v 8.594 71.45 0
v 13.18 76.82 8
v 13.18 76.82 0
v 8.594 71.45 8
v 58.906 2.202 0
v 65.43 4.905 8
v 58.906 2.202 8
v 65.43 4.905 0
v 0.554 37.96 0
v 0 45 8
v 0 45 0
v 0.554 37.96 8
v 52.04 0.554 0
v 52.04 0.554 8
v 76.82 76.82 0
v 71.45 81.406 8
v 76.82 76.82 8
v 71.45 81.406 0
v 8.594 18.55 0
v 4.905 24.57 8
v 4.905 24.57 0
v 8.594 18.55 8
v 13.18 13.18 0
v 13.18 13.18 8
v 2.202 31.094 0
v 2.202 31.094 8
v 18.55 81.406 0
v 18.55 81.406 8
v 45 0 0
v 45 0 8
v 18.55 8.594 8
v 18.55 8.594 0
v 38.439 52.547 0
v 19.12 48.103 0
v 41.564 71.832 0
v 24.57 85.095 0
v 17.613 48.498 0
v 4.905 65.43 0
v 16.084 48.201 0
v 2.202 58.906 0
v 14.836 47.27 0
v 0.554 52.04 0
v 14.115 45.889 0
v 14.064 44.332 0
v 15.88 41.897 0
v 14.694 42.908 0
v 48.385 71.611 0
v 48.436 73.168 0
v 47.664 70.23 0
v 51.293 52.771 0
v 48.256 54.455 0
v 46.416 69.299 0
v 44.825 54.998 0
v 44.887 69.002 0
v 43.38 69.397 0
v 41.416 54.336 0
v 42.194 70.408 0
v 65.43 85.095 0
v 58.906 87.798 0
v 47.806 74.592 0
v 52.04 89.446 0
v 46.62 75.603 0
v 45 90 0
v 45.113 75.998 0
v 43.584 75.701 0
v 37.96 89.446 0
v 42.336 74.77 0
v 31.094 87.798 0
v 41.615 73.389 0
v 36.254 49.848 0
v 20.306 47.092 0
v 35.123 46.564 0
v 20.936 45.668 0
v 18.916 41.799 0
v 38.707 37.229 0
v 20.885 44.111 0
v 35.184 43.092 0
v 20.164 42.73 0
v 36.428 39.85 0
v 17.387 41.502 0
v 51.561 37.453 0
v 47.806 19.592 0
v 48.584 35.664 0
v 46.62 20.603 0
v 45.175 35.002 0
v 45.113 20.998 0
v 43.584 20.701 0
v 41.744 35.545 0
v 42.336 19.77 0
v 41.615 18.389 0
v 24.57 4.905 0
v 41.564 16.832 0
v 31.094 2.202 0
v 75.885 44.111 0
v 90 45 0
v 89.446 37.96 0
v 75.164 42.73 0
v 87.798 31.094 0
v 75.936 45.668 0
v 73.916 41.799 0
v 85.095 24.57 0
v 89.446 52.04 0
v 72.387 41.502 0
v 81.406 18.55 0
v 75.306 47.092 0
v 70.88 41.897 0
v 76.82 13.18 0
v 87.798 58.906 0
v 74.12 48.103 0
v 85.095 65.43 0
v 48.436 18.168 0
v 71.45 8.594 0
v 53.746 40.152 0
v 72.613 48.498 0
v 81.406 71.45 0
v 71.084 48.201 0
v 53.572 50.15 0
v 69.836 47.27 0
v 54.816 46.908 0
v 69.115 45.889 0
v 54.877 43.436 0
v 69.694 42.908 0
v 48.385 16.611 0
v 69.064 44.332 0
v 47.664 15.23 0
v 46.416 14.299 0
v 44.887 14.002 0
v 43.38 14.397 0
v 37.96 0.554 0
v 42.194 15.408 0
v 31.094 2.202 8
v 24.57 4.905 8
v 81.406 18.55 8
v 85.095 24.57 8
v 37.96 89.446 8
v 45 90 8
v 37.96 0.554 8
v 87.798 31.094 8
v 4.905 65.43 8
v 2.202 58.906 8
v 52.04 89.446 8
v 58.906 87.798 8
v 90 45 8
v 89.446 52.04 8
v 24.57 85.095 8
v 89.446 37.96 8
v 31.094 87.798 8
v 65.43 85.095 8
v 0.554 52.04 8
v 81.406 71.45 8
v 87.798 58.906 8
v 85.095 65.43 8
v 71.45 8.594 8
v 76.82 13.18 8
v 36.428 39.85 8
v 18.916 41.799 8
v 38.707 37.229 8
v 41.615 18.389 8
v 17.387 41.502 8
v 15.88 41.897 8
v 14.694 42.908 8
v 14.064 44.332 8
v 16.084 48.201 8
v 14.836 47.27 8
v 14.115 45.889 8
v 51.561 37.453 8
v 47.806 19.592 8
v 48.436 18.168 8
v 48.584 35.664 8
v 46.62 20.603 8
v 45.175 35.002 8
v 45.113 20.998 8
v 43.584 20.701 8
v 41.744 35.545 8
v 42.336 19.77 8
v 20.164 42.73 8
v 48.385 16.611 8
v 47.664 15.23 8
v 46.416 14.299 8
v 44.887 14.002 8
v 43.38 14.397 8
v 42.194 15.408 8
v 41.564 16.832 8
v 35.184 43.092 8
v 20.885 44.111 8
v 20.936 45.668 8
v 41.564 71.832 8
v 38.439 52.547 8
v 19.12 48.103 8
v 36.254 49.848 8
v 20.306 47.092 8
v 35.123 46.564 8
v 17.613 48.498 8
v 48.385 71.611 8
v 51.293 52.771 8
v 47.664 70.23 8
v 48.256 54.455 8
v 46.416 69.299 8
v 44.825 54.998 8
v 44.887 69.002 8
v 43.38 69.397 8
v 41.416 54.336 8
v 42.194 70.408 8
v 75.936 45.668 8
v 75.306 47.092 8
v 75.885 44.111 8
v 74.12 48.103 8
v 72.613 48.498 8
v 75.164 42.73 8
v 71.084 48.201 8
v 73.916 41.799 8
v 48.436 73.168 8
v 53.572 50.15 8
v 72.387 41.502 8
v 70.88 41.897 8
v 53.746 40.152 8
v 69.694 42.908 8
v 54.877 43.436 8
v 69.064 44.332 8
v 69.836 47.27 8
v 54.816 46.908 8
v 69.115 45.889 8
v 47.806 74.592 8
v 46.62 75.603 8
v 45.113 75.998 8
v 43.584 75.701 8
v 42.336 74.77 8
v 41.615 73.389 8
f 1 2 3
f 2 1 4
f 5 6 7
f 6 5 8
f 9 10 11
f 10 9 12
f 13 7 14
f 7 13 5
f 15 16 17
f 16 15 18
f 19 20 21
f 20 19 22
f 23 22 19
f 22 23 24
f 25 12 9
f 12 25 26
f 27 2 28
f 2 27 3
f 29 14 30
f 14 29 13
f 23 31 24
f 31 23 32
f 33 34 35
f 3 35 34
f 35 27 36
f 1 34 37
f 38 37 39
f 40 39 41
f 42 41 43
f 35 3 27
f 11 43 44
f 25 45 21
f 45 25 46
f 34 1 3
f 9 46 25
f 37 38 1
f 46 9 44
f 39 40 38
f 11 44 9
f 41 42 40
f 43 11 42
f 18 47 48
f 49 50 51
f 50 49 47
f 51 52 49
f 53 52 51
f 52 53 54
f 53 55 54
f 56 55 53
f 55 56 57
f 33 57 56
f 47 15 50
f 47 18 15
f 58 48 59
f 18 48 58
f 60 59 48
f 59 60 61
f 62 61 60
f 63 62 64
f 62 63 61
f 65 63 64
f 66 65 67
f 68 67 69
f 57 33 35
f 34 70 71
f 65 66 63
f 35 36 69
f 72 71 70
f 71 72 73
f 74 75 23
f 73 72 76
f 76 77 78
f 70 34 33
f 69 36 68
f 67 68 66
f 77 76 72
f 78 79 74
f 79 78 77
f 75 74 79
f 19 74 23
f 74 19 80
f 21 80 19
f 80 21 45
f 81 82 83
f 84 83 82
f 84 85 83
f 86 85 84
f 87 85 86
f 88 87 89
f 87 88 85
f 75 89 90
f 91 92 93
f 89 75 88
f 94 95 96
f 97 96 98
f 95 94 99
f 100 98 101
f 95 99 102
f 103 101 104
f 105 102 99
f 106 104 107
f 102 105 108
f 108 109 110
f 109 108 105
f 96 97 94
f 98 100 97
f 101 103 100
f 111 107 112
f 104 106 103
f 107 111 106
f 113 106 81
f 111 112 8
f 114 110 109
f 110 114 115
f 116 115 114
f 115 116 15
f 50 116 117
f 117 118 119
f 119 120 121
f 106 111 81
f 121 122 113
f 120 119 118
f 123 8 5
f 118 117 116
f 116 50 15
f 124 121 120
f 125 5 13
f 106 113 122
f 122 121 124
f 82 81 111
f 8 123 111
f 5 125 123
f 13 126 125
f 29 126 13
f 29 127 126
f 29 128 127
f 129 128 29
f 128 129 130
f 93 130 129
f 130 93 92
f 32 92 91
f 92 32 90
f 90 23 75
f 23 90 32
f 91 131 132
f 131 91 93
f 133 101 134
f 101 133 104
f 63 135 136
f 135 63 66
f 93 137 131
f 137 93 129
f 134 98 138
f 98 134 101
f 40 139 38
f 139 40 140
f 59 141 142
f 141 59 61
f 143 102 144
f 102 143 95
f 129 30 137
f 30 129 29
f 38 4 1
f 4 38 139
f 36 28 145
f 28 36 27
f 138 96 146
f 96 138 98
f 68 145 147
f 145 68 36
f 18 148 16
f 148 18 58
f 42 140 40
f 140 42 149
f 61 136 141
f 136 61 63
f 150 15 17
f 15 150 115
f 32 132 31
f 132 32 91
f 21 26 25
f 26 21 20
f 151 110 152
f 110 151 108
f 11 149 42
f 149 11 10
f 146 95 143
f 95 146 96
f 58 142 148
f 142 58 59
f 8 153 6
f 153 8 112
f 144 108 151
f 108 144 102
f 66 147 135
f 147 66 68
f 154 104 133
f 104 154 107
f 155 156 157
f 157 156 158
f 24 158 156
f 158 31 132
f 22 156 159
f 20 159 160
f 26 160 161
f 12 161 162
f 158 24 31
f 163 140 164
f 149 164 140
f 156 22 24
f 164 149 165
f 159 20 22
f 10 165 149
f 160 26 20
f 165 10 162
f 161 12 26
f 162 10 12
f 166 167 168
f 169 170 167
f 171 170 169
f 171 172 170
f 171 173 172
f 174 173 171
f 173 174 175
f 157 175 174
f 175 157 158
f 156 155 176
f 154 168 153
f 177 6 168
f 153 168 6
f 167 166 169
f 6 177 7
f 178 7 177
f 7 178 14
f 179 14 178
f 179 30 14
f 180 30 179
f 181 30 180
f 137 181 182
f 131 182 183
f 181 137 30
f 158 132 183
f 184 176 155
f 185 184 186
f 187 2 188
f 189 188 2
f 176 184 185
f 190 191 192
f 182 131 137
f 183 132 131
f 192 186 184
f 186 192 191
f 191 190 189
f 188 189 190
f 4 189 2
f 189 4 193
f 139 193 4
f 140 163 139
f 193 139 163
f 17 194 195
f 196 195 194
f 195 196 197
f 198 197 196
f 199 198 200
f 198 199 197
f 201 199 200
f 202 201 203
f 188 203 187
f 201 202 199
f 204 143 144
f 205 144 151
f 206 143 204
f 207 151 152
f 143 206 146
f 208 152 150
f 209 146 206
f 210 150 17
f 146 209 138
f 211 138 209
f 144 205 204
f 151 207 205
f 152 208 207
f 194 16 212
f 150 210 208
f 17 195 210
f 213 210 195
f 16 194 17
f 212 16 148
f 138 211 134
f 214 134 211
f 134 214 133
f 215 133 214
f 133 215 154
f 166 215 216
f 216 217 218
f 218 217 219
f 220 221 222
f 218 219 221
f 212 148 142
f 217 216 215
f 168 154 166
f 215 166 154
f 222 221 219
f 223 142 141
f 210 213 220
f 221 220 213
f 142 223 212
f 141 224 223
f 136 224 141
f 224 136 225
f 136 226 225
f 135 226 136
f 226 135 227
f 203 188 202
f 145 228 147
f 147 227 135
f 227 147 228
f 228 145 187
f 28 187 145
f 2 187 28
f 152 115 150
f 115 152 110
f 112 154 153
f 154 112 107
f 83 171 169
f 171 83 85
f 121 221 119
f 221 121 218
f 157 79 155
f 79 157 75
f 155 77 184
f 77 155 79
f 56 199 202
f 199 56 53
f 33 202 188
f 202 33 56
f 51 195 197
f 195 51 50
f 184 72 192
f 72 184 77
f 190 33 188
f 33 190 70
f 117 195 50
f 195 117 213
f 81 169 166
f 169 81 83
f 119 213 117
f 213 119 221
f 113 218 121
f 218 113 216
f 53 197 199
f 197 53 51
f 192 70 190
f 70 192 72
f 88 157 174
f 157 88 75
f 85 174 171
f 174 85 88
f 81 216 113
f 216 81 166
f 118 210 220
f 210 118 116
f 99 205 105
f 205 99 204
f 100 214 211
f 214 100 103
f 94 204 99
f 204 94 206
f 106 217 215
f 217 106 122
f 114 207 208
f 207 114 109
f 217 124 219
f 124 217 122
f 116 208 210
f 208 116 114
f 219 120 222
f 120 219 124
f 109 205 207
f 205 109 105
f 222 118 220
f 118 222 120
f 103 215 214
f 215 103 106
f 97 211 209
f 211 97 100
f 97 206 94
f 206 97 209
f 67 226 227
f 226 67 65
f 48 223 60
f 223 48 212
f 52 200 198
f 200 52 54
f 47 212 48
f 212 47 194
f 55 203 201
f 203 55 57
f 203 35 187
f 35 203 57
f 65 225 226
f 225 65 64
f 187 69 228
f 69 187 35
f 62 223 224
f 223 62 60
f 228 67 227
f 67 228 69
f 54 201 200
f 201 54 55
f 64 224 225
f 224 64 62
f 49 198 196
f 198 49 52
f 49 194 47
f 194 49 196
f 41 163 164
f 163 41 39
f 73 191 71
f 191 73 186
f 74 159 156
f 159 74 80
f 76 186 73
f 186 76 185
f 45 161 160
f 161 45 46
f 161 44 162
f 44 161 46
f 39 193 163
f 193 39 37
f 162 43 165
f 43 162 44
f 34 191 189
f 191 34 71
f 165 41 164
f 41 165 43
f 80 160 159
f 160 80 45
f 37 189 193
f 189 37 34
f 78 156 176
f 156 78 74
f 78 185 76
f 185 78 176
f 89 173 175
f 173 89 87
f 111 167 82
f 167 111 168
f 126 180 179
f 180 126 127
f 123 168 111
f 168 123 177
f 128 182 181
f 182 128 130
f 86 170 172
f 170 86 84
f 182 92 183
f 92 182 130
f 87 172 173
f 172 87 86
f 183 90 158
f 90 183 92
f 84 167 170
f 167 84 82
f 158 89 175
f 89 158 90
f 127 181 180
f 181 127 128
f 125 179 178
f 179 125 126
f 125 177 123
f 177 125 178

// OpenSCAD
$fn = 32;

// ----------------------------------------------------------------------
// Spacer plate: round flange R45, 4 bolts
// ----------------------------------------------------------------------

// --- parameters (mm) ---
bore_r = 10;              // centre bore radius
bolt_r = 3.5;             // bolt hole radius
plate_t = 8;              // plate thickness, Z (extrusion height)
flange_r = 45;            // flange radius
n_bolt = 4;               // bolt hole count
ring_r = 27.5;            // bolt circle radius

profile = [[90, 45], [89.446, 52.04], [87.798, 58.906], [85.095, 65.43], [81.406, 71.45], [76.82, 76.82], [71.45, 81.406], [65.43, 85.095], [58.906, 87.798], [52.04, 89.446], [45, 90], [37.96, 89.446], [31.094, 87.798], [24.57, 85.095], [18.55, 81.406], [13.18, 76.82], [8.594, 71.45], [4.905, 65.43], [2.202, 58.906], [0.554, 52.04], [0, 45], [0.554, 37.96], [2.202, 31.094], [4.905, 24.57], [8.594, 18.55], [13.18, 13.18], [18.55, 8.594], [24.57, 4.905], [31.094, 2.202], [37.96, 0.554], [45, 0], [52.04, 0.554], [58.906, 2.202], [65.43, 4.905], [71.45, 8.594], [76.82, 13.18], [81.406, 18.55], [85.095, 24.57], [87.798, 31.094], [89.446, 37.96]];  // primary outline, 40 points, counter clockwise
void_1 = [[54.816, 46.908], [53.572, 50.15], [51.293, 52.771], [48.256, 54.455], [44.825, 54.998], [41.416, 54.336], [38.439, 52.547], [36.254, 49.848], [35.123, 46.564], [35.184, 43.092], [36.428, 39.85], [38.707, 37.229], [41.744, 35.545], [45.175, 35.002], [48.584, 35.664], [51.561, 37.453], [53.746, 40.152], [54.877, 43.436]];  // centre bore, 18 points
void_2 = [[75.936, 45.668], [75.306, 47.092], [74.12, 48.103], [72.613, 48.498], [71.084, 48.201], [69.836, 47.27], [69.115, 45.889], [69.064, 44.332], [69.694, 42.908], [70.88, 41.897], [72.387, 41.502], [73.916, 41.799], [75.164, 42.73], [75.885, 44.111]];  // bolt hole 1, 14 points
void_3 = [[48.436, 73.168], [47.806, 74.592], [46.62, 75.603], [45.113, 75.998], [43.584, 75.701], [42.336, 74.77], [41.615, 73.389], [41.564, 71.832], [42.194, 70.408], [43.38, 69.397], [44.887, 69.002], [46.416, 69.299], [47.664, 70.23], [48.385, 71.611]];  // bolt hole 2, 14 points
void_4 = [[20.936, 45.668], [20.306, 47.092], [19.12, 48.103], [17.613, 48.498], [16.084, 48.201], [14.836, 47.27], [14.115, 45.889], [14.064, 44.332], [14.694, 42.908], [15.88, 41.897], [17.387, 41.502], [18.916, 41.799], [20.164, 42.73], [20.885, 44.111]];  // bolt hole 3, 14 points
void_5 = [[48.436, 18.168], [47.806, 19.592], [46.62, 20.603], [45.113, 20.998], [43.584, 20.701], [42.336, 19.77], [41.615, 18.389], [41.564, 16.832], [42.194, 15.408], [43.38, 14.397], [44.887, 14.002], [46.416, 14.299], [47.664, 15.23], [48.385, 16.611]];  // bolt hole 4, 14 points

// --- the one profile operation ---
difference() {
  linear_extrude(height = plate_t) polygon(points = profile);
  translate([0, 0, -1])
    linear_extrude(height = plate_t + 2) polygon(points = void_1);
  translate([0, 0, -1])
    linear_extrude(height = plate_t + 2) polygon(points = void_2);
  translate([0, 0, -1])
    linear_extrude(height = plate_t + 2) polygon(points = void_3);
  translate([0, 0, -1])
    linear_extrude(height = plate_t + 2) polygon(points = void_4);
  translate([0, 0, -1])
    linear_extrude(height = plate_t + 2) polygon(points = void_5);
}
